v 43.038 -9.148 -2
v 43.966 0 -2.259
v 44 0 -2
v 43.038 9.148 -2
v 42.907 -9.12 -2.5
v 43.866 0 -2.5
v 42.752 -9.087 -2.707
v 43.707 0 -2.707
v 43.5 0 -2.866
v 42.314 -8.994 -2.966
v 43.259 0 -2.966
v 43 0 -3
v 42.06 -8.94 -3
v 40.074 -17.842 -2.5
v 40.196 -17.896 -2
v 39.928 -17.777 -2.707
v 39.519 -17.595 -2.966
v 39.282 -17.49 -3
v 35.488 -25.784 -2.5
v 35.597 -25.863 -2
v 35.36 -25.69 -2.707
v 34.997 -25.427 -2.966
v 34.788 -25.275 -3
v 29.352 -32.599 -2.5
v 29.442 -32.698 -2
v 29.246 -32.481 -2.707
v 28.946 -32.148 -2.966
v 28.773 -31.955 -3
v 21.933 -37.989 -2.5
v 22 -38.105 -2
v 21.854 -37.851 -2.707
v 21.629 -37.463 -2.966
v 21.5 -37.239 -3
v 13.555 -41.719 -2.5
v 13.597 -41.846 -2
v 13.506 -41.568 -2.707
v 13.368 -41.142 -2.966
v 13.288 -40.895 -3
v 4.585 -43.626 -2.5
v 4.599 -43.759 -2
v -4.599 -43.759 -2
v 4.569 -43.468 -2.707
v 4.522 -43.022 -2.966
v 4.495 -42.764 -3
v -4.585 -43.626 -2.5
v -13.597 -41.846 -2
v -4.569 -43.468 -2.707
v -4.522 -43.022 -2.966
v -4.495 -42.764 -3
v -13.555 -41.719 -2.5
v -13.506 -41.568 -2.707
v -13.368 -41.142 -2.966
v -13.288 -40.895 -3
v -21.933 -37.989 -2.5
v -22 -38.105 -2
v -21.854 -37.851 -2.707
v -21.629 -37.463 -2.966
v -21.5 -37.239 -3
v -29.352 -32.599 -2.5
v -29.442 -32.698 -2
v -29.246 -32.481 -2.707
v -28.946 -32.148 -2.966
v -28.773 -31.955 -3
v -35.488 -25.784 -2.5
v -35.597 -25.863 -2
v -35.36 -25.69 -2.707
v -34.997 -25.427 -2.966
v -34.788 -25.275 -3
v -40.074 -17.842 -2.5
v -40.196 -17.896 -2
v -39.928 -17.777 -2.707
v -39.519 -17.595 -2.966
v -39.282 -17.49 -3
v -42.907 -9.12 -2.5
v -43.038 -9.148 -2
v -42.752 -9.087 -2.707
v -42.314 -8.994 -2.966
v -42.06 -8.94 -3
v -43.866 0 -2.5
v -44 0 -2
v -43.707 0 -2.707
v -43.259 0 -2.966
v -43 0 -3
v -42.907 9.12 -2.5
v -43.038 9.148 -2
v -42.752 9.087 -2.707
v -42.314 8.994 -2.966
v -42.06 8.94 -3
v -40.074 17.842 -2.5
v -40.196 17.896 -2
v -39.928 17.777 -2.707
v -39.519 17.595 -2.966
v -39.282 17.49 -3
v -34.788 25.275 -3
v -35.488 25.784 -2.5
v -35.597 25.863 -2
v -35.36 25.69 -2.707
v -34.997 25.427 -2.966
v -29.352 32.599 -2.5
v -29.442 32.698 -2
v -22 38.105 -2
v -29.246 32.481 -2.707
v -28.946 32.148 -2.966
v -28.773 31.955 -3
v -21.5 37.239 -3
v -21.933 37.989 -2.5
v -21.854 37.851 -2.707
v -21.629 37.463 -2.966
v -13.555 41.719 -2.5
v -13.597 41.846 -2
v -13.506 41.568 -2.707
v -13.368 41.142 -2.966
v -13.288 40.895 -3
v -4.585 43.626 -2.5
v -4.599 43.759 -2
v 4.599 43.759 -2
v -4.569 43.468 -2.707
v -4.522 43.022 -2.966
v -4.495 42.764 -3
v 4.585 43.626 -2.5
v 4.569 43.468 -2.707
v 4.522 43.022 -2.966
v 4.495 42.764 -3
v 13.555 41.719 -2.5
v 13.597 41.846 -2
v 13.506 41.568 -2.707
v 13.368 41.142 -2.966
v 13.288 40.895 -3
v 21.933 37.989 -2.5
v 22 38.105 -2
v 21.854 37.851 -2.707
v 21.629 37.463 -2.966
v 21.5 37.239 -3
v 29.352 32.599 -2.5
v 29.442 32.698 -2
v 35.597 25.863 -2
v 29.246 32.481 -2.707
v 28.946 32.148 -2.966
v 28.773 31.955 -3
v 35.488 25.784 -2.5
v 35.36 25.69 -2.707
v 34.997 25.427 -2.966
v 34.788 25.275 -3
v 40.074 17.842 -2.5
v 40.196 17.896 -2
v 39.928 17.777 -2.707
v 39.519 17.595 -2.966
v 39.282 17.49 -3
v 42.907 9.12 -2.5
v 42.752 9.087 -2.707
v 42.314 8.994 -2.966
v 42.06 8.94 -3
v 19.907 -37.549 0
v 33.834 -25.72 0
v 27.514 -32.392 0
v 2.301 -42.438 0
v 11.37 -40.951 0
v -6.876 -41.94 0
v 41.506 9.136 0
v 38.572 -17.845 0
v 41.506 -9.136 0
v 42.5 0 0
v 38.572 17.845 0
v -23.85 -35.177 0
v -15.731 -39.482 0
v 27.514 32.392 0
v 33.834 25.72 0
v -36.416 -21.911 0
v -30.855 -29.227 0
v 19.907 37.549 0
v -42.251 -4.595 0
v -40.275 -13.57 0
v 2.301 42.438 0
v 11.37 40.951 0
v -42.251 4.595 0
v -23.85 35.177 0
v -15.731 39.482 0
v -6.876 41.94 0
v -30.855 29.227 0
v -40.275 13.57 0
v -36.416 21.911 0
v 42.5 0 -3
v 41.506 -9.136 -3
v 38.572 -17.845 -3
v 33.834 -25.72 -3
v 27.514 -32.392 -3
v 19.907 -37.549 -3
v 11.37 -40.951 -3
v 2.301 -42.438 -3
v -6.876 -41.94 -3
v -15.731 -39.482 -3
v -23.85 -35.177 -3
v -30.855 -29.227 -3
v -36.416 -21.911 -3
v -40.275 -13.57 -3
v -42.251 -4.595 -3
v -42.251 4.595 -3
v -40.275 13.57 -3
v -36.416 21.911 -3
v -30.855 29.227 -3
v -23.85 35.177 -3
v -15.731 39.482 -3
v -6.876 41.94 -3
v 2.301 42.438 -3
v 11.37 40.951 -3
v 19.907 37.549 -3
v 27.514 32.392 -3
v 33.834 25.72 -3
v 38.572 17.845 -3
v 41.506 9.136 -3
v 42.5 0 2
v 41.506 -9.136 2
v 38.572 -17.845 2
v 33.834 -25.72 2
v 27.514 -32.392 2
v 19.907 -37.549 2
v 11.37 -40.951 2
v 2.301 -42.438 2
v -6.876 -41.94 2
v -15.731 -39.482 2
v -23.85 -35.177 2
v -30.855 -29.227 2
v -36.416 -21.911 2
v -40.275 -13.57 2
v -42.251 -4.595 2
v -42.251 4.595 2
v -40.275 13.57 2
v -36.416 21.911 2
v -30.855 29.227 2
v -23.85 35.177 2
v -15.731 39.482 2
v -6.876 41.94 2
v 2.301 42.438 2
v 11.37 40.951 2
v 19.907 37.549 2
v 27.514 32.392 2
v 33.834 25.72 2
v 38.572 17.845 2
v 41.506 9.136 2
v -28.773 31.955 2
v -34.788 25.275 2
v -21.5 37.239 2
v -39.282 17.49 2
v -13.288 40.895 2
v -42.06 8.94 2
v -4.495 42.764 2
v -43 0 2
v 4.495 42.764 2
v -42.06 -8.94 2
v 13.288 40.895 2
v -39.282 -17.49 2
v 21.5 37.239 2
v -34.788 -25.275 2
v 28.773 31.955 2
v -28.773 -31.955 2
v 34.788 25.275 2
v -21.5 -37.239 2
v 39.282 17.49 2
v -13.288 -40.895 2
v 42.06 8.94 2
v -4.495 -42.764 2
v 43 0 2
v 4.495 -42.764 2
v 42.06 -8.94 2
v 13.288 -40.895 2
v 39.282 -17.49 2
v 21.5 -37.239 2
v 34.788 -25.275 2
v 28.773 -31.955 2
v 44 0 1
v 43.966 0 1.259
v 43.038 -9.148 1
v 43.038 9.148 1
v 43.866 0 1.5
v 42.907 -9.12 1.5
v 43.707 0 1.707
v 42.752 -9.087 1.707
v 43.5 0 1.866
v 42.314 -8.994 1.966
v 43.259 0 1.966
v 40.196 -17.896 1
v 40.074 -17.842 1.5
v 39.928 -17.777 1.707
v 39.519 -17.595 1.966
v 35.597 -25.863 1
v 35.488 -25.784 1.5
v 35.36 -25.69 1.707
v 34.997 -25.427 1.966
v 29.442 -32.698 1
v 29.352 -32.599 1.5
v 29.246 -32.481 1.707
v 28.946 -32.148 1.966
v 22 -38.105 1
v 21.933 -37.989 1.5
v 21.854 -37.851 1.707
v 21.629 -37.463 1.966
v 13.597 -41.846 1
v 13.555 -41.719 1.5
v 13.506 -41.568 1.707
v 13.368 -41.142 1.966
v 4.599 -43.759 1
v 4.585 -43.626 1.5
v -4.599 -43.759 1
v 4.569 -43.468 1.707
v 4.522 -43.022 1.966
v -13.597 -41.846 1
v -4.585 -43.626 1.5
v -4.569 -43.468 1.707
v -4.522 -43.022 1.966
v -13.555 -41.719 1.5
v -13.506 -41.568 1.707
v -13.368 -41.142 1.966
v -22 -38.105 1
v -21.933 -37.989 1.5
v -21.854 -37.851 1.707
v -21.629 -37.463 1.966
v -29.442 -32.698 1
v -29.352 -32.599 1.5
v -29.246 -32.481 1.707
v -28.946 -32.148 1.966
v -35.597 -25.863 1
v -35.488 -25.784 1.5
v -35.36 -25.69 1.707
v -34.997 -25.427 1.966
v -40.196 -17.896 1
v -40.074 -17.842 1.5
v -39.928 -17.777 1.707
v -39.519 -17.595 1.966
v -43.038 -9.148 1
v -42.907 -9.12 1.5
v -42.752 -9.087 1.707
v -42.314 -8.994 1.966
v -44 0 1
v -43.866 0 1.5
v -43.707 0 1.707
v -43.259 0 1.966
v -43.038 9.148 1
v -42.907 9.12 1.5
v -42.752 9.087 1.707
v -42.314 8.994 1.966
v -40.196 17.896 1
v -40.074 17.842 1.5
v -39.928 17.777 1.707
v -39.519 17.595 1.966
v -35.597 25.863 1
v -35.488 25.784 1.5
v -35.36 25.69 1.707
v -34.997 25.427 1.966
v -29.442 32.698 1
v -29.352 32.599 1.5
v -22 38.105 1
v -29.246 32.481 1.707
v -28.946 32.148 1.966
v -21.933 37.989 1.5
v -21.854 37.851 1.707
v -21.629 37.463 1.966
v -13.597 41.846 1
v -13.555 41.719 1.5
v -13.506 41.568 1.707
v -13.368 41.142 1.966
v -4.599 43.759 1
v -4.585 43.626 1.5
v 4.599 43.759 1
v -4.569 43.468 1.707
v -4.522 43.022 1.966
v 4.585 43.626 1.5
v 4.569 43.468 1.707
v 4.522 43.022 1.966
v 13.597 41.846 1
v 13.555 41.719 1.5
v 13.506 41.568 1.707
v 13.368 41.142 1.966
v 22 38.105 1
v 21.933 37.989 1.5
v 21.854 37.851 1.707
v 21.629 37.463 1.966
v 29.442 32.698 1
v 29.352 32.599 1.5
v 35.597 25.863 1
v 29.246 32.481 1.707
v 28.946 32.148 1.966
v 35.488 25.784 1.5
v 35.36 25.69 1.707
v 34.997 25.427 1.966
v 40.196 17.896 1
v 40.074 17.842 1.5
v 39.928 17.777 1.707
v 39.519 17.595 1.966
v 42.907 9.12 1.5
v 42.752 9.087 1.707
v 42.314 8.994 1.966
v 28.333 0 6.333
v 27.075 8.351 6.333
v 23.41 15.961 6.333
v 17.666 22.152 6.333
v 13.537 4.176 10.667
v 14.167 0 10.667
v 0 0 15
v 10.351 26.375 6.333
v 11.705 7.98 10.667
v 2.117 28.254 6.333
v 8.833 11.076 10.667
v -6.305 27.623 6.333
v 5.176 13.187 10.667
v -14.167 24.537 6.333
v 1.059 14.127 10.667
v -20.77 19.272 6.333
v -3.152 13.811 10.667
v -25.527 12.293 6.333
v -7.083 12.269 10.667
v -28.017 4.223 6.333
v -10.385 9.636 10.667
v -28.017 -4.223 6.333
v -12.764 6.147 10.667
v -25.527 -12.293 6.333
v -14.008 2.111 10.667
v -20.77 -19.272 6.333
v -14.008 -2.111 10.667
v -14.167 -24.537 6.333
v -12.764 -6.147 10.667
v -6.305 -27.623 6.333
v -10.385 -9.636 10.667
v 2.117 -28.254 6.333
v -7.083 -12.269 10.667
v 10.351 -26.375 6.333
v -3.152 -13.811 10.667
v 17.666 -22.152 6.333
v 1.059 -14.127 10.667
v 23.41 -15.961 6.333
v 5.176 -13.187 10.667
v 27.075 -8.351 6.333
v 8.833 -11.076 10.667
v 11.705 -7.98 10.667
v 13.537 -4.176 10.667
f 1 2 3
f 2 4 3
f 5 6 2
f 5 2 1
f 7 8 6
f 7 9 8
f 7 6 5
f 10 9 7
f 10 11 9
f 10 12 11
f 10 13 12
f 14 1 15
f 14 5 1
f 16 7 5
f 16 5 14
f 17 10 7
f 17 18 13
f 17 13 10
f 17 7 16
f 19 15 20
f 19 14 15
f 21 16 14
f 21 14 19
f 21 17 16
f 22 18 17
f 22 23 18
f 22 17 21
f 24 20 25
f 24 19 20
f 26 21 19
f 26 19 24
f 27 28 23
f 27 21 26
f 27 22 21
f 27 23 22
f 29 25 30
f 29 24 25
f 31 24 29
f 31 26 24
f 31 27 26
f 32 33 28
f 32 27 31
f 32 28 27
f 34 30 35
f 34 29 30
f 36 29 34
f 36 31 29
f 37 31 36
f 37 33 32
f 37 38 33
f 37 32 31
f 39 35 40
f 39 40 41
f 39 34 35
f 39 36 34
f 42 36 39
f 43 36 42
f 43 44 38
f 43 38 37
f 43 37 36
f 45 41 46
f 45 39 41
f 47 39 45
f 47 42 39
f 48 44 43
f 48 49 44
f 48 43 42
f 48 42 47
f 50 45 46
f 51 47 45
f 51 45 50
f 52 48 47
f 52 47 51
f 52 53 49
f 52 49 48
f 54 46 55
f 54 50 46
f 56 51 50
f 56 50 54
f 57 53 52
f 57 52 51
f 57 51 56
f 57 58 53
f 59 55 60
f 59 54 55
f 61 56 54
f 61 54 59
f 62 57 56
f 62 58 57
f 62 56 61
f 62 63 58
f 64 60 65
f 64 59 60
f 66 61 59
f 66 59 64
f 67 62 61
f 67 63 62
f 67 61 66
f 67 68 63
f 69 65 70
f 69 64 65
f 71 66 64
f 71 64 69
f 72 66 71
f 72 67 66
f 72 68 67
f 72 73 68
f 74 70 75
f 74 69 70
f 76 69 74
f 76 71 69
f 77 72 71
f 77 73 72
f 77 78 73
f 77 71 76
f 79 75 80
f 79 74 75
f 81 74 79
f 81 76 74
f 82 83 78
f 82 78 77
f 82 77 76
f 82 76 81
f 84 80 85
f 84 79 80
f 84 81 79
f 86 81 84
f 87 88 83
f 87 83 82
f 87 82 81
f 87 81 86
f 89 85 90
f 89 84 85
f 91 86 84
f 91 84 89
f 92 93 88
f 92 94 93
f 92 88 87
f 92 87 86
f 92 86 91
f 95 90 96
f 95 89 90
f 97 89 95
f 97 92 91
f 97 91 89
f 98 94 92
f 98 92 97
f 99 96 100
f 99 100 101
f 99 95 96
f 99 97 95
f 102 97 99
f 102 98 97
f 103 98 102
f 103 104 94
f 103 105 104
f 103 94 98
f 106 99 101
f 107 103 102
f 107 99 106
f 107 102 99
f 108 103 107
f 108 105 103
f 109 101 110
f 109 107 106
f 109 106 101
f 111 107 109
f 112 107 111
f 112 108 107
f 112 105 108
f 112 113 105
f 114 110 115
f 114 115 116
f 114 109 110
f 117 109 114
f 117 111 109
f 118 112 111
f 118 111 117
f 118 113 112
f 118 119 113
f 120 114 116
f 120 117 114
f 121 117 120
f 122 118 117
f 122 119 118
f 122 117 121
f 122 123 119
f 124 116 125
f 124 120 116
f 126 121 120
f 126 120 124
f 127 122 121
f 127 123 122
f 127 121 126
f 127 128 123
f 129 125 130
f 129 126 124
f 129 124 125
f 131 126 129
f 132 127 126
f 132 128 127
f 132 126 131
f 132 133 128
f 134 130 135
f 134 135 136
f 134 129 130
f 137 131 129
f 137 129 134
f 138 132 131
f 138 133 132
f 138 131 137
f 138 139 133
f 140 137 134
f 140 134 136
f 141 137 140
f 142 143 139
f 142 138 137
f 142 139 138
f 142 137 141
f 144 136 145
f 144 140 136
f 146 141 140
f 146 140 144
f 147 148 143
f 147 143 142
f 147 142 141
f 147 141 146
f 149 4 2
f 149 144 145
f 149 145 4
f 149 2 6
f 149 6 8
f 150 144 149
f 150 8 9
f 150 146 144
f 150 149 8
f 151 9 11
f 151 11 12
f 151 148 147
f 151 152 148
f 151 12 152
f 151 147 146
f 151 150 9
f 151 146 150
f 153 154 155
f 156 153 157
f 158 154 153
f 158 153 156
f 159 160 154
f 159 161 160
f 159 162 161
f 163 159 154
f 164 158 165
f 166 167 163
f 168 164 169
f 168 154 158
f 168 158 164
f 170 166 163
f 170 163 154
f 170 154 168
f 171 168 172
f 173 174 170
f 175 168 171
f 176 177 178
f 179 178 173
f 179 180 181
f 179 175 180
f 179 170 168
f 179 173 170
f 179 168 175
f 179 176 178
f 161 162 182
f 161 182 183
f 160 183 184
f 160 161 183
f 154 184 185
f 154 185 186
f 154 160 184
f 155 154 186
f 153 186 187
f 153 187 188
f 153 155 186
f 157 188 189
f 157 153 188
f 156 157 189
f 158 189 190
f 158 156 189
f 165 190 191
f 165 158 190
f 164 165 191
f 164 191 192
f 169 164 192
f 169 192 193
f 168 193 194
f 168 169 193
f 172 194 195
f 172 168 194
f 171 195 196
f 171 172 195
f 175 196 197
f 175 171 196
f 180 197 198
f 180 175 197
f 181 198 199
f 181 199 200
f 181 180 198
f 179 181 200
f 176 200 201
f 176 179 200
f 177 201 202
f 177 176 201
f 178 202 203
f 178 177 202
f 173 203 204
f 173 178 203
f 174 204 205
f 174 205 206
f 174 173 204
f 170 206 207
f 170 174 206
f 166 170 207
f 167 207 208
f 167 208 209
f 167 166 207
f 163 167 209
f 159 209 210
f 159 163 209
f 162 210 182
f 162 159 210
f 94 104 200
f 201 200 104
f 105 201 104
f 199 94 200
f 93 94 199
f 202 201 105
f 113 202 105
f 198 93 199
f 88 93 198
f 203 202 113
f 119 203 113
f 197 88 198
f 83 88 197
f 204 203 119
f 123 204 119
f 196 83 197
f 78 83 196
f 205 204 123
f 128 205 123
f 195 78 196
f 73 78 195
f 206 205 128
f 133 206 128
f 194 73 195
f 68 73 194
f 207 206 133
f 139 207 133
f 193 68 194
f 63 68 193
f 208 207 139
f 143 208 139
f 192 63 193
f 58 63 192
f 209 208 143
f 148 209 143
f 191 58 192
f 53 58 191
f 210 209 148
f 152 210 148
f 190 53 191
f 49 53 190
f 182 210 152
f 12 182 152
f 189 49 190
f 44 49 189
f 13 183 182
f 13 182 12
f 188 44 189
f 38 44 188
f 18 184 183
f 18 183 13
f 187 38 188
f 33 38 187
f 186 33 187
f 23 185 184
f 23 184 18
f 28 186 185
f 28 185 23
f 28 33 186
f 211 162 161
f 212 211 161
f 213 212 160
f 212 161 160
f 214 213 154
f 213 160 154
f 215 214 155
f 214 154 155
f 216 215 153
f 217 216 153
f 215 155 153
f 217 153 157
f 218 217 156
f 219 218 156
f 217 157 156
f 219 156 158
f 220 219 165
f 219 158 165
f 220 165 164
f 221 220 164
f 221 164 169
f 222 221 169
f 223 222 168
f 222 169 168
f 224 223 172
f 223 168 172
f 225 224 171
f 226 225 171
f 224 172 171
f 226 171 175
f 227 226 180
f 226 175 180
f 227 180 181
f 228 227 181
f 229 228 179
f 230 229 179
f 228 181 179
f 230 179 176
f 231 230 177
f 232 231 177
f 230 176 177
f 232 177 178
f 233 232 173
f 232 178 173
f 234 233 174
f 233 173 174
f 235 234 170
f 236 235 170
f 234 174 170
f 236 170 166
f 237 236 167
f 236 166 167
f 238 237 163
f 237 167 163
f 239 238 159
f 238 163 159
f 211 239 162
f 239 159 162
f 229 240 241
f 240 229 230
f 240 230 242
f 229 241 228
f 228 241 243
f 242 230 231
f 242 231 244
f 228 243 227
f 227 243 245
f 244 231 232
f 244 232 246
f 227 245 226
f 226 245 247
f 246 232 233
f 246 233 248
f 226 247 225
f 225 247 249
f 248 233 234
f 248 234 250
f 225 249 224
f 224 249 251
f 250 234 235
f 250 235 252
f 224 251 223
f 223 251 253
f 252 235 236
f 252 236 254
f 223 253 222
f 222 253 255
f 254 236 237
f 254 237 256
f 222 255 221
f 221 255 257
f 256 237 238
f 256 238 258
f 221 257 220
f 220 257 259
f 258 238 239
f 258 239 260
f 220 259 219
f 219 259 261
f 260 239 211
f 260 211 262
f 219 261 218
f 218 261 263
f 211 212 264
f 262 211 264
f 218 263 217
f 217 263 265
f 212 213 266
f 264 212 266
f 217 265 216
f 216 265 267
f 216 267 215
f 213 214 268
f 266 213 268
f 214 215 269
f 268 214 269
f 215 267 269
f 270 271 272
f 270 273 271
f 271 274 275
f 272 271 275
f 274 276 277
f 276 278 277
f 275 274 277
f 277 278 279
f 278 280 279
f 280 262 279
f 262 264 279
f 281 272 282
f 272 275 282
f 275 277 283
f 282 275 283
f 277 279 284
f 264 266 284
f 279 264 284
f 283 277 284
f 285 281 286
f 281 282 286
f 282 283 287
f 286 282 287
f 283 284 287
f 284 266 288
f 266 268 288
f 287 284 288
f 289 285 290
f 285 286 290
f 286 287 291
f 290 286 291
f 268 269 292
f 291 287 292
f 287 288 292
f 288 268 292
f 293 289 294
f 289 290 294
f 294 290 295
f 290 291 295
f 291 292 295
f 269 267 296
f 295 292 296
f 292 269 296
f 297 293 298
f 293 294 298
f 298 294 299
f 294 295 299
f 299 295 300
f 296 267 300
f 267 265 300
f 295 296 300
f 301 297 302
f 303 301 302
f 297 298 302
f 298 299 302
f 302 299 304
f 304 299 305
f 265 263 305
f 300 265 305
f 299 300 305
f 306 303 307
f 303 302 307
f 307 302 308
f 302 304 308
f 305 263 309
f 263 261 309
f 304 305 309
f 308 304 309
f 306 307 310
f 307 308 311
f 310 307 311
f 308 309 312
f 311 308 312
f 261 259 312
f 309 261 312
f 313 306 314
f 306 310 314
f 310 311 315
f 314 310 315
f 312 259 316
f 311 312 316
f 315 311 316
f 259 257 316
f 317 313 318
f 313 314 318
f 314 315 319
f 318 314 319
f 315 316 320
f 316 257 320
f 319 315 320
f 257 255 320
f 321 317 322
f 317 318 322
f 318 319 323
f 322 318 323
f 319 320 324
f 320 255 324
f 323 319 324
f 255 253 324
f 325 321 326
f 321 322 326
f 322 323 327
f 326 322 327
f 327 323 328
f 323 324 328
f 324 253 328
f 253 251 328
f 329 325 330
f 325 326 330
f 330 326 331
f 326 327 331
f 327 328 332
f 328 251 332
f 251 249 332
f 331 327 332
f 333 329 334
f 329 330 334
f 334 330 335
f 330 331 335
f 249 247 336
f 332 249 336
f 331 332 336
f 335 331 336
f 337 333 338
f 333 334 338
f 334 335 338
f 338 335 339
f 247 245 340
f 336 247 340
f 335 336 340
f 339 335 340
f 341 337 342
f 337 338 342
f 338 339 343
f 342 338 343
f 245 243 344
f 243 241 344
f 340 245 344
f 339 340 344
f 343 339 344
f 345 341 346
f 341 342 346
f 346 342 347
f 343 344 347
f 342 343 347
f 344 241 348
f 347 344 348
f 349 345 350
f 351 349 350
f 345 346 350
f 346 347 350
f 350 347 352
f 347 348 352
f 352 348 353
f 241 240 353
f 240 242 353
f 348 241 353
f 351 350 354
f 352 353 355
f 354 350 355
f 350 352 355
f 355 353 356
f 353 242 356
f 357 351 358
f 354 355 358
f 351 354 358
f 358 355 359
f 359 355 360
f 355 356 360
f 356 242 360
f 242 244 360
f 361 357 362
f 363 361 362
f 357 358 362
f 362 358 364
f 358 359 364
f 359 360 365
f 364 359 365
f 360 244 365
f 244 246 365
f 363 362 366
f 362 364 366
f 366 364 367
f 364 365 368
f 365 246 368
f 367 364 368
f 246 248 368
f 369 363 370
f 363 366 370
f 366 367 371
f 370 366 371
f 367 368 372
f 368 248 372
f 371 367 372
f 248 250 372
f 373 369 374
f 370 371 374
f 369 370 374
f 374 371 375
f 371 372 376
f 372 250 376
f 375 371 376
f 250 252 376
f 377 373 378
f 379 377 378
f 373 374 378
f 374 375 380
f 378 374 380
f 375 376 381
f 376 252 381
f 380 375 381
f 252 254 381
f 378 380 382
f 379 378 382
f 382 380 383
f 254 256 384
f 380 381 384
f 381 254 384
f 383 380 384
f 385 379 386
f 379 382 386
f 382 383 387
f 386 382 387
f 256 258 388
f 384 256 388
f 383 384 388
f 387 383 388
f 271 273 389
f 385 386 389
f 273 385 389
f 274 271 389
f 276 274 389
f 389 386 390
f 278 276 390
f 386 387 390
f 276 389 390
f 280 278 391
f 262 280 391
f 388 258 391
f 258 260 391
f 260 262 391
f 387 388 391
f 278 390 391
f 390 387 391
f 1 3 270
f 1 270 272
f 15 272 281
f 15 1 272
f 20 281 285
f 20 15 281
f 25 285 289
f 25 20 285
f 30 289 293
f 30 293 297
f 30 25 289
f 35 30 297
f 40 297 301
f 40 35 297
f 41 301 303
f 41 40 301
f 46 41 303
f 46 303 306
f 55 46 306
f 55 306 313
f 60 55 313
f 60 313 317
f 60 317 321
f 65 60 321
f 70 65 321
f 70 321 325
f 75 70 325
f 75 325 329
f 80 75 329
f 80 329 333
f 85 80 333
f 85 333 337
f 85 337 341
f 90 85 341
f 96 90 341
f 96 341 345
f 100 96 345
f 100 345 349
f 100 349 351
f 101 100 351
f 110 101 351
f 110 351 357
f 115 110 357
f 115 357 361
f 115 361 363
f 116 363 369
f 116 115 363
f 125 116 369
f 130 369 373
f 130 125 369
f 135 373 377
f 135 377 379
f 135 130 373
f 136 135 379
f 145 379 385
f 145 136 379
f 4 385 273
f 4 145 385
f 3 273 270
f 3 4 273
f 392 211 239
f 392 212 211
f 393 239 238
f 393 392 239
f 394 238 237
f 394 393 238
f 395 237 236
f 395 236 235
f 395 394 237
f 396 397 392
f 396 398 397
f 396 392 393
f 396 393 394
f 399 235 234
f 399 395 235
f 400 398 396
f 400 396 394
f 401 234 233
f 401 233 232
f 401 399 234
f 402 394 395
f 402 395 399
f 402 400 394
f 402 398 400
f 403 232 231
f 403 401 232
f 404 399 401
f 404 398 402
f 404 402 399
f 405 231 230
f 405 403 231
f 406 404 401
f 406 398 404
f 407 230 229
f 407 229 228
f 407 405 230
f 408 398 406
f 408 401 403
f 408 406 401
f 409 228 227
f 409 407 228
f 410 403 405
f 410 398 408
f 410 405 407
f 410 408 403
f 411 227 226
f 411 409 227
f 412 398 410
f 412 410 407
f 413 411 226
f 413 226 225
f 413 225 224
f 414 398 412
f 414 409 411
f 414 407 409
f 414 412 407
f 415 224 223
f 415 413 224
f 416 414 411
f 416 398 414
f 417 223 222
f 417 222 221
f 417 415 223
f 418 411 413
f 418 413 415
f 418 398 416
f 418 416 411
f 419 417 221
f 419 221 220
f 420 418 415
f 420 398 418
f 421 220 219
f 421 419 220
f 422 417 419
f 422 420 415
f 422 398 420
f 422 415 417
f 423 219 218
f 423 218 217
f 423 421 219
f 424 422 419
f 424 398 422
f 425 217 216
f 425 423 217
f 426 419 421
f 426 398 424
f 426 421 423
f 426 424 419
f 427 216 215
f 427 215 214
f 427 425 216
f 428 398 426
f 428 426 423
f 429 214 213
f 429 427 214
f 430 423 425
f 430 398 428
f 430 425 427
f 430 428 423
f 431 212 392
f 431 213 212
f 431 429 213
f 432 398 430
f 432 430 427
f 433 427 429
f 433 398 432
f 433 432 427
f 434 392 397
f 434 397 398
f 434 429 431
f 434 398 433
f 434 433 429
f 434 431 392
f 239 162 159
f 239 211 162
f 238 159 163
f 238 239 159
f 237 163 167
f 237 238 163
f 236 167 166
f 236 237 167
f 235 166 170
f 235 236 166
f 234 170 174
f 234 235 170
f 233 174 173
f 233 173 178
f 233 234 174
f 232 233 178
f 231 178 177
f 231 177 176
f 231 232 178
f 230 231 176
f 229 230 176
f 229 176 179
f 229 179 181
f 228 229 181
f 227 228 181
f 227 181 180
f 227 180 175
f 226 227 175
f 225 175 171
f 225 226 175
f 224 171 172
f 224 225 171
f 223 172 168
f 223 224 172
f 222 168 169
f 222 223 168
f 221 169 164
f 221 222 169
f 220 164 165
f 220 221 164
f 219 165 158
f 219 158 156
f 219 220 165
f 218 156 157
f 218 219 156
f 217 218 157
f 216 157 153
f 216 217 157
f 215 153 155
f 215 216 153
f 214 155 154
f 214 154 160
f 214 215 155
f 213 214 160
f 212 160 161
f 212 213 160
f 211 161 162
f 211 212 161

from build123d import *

# Parameters (mm, degrees)
F2_R          = 44
F2_R_2        = 42.5
F3_DEPTH      = 3
F3_DEPTH_BACK = 2
F4_R          = 1


with BuildPart() as f1:
    # F0 (on Front) → F1 (revolve)
    with BuildSketch(Plane.XZ):
        Polygon((0, 15), (0, 0), (42.5, 0), (42.5, 2), align=None)
    revolve(axis=Axis((0, 0, 7.5), (0, 0, 1)))


with BuildPart() as f3:
    # F2 (on face) → F3 (new body, two sides)
    with BuildSketch(Plane(origin=(0, 0, 0), x_dir=(1, 0, 0), z_dir=(0, 0, -1))) as f3_sk:
        Circle(F2_R)
        Circle(F2_R_2, mode=Mode.SUBTRACT)
    extrude(amount=F3_DEPTH)
    extrude(f3_sk.sketch, amount=-F3_DEPTH_BACK)

    # F4
    f4_edges = [f3.edges().sort_by_distance(p)[0] for p in [
        (-44, 0, -3),
        (-44, 0, 2),
    ]]
    fillet(f4_edges, radius=F4_R)


solid = Compound([f1.part, f3.part])
